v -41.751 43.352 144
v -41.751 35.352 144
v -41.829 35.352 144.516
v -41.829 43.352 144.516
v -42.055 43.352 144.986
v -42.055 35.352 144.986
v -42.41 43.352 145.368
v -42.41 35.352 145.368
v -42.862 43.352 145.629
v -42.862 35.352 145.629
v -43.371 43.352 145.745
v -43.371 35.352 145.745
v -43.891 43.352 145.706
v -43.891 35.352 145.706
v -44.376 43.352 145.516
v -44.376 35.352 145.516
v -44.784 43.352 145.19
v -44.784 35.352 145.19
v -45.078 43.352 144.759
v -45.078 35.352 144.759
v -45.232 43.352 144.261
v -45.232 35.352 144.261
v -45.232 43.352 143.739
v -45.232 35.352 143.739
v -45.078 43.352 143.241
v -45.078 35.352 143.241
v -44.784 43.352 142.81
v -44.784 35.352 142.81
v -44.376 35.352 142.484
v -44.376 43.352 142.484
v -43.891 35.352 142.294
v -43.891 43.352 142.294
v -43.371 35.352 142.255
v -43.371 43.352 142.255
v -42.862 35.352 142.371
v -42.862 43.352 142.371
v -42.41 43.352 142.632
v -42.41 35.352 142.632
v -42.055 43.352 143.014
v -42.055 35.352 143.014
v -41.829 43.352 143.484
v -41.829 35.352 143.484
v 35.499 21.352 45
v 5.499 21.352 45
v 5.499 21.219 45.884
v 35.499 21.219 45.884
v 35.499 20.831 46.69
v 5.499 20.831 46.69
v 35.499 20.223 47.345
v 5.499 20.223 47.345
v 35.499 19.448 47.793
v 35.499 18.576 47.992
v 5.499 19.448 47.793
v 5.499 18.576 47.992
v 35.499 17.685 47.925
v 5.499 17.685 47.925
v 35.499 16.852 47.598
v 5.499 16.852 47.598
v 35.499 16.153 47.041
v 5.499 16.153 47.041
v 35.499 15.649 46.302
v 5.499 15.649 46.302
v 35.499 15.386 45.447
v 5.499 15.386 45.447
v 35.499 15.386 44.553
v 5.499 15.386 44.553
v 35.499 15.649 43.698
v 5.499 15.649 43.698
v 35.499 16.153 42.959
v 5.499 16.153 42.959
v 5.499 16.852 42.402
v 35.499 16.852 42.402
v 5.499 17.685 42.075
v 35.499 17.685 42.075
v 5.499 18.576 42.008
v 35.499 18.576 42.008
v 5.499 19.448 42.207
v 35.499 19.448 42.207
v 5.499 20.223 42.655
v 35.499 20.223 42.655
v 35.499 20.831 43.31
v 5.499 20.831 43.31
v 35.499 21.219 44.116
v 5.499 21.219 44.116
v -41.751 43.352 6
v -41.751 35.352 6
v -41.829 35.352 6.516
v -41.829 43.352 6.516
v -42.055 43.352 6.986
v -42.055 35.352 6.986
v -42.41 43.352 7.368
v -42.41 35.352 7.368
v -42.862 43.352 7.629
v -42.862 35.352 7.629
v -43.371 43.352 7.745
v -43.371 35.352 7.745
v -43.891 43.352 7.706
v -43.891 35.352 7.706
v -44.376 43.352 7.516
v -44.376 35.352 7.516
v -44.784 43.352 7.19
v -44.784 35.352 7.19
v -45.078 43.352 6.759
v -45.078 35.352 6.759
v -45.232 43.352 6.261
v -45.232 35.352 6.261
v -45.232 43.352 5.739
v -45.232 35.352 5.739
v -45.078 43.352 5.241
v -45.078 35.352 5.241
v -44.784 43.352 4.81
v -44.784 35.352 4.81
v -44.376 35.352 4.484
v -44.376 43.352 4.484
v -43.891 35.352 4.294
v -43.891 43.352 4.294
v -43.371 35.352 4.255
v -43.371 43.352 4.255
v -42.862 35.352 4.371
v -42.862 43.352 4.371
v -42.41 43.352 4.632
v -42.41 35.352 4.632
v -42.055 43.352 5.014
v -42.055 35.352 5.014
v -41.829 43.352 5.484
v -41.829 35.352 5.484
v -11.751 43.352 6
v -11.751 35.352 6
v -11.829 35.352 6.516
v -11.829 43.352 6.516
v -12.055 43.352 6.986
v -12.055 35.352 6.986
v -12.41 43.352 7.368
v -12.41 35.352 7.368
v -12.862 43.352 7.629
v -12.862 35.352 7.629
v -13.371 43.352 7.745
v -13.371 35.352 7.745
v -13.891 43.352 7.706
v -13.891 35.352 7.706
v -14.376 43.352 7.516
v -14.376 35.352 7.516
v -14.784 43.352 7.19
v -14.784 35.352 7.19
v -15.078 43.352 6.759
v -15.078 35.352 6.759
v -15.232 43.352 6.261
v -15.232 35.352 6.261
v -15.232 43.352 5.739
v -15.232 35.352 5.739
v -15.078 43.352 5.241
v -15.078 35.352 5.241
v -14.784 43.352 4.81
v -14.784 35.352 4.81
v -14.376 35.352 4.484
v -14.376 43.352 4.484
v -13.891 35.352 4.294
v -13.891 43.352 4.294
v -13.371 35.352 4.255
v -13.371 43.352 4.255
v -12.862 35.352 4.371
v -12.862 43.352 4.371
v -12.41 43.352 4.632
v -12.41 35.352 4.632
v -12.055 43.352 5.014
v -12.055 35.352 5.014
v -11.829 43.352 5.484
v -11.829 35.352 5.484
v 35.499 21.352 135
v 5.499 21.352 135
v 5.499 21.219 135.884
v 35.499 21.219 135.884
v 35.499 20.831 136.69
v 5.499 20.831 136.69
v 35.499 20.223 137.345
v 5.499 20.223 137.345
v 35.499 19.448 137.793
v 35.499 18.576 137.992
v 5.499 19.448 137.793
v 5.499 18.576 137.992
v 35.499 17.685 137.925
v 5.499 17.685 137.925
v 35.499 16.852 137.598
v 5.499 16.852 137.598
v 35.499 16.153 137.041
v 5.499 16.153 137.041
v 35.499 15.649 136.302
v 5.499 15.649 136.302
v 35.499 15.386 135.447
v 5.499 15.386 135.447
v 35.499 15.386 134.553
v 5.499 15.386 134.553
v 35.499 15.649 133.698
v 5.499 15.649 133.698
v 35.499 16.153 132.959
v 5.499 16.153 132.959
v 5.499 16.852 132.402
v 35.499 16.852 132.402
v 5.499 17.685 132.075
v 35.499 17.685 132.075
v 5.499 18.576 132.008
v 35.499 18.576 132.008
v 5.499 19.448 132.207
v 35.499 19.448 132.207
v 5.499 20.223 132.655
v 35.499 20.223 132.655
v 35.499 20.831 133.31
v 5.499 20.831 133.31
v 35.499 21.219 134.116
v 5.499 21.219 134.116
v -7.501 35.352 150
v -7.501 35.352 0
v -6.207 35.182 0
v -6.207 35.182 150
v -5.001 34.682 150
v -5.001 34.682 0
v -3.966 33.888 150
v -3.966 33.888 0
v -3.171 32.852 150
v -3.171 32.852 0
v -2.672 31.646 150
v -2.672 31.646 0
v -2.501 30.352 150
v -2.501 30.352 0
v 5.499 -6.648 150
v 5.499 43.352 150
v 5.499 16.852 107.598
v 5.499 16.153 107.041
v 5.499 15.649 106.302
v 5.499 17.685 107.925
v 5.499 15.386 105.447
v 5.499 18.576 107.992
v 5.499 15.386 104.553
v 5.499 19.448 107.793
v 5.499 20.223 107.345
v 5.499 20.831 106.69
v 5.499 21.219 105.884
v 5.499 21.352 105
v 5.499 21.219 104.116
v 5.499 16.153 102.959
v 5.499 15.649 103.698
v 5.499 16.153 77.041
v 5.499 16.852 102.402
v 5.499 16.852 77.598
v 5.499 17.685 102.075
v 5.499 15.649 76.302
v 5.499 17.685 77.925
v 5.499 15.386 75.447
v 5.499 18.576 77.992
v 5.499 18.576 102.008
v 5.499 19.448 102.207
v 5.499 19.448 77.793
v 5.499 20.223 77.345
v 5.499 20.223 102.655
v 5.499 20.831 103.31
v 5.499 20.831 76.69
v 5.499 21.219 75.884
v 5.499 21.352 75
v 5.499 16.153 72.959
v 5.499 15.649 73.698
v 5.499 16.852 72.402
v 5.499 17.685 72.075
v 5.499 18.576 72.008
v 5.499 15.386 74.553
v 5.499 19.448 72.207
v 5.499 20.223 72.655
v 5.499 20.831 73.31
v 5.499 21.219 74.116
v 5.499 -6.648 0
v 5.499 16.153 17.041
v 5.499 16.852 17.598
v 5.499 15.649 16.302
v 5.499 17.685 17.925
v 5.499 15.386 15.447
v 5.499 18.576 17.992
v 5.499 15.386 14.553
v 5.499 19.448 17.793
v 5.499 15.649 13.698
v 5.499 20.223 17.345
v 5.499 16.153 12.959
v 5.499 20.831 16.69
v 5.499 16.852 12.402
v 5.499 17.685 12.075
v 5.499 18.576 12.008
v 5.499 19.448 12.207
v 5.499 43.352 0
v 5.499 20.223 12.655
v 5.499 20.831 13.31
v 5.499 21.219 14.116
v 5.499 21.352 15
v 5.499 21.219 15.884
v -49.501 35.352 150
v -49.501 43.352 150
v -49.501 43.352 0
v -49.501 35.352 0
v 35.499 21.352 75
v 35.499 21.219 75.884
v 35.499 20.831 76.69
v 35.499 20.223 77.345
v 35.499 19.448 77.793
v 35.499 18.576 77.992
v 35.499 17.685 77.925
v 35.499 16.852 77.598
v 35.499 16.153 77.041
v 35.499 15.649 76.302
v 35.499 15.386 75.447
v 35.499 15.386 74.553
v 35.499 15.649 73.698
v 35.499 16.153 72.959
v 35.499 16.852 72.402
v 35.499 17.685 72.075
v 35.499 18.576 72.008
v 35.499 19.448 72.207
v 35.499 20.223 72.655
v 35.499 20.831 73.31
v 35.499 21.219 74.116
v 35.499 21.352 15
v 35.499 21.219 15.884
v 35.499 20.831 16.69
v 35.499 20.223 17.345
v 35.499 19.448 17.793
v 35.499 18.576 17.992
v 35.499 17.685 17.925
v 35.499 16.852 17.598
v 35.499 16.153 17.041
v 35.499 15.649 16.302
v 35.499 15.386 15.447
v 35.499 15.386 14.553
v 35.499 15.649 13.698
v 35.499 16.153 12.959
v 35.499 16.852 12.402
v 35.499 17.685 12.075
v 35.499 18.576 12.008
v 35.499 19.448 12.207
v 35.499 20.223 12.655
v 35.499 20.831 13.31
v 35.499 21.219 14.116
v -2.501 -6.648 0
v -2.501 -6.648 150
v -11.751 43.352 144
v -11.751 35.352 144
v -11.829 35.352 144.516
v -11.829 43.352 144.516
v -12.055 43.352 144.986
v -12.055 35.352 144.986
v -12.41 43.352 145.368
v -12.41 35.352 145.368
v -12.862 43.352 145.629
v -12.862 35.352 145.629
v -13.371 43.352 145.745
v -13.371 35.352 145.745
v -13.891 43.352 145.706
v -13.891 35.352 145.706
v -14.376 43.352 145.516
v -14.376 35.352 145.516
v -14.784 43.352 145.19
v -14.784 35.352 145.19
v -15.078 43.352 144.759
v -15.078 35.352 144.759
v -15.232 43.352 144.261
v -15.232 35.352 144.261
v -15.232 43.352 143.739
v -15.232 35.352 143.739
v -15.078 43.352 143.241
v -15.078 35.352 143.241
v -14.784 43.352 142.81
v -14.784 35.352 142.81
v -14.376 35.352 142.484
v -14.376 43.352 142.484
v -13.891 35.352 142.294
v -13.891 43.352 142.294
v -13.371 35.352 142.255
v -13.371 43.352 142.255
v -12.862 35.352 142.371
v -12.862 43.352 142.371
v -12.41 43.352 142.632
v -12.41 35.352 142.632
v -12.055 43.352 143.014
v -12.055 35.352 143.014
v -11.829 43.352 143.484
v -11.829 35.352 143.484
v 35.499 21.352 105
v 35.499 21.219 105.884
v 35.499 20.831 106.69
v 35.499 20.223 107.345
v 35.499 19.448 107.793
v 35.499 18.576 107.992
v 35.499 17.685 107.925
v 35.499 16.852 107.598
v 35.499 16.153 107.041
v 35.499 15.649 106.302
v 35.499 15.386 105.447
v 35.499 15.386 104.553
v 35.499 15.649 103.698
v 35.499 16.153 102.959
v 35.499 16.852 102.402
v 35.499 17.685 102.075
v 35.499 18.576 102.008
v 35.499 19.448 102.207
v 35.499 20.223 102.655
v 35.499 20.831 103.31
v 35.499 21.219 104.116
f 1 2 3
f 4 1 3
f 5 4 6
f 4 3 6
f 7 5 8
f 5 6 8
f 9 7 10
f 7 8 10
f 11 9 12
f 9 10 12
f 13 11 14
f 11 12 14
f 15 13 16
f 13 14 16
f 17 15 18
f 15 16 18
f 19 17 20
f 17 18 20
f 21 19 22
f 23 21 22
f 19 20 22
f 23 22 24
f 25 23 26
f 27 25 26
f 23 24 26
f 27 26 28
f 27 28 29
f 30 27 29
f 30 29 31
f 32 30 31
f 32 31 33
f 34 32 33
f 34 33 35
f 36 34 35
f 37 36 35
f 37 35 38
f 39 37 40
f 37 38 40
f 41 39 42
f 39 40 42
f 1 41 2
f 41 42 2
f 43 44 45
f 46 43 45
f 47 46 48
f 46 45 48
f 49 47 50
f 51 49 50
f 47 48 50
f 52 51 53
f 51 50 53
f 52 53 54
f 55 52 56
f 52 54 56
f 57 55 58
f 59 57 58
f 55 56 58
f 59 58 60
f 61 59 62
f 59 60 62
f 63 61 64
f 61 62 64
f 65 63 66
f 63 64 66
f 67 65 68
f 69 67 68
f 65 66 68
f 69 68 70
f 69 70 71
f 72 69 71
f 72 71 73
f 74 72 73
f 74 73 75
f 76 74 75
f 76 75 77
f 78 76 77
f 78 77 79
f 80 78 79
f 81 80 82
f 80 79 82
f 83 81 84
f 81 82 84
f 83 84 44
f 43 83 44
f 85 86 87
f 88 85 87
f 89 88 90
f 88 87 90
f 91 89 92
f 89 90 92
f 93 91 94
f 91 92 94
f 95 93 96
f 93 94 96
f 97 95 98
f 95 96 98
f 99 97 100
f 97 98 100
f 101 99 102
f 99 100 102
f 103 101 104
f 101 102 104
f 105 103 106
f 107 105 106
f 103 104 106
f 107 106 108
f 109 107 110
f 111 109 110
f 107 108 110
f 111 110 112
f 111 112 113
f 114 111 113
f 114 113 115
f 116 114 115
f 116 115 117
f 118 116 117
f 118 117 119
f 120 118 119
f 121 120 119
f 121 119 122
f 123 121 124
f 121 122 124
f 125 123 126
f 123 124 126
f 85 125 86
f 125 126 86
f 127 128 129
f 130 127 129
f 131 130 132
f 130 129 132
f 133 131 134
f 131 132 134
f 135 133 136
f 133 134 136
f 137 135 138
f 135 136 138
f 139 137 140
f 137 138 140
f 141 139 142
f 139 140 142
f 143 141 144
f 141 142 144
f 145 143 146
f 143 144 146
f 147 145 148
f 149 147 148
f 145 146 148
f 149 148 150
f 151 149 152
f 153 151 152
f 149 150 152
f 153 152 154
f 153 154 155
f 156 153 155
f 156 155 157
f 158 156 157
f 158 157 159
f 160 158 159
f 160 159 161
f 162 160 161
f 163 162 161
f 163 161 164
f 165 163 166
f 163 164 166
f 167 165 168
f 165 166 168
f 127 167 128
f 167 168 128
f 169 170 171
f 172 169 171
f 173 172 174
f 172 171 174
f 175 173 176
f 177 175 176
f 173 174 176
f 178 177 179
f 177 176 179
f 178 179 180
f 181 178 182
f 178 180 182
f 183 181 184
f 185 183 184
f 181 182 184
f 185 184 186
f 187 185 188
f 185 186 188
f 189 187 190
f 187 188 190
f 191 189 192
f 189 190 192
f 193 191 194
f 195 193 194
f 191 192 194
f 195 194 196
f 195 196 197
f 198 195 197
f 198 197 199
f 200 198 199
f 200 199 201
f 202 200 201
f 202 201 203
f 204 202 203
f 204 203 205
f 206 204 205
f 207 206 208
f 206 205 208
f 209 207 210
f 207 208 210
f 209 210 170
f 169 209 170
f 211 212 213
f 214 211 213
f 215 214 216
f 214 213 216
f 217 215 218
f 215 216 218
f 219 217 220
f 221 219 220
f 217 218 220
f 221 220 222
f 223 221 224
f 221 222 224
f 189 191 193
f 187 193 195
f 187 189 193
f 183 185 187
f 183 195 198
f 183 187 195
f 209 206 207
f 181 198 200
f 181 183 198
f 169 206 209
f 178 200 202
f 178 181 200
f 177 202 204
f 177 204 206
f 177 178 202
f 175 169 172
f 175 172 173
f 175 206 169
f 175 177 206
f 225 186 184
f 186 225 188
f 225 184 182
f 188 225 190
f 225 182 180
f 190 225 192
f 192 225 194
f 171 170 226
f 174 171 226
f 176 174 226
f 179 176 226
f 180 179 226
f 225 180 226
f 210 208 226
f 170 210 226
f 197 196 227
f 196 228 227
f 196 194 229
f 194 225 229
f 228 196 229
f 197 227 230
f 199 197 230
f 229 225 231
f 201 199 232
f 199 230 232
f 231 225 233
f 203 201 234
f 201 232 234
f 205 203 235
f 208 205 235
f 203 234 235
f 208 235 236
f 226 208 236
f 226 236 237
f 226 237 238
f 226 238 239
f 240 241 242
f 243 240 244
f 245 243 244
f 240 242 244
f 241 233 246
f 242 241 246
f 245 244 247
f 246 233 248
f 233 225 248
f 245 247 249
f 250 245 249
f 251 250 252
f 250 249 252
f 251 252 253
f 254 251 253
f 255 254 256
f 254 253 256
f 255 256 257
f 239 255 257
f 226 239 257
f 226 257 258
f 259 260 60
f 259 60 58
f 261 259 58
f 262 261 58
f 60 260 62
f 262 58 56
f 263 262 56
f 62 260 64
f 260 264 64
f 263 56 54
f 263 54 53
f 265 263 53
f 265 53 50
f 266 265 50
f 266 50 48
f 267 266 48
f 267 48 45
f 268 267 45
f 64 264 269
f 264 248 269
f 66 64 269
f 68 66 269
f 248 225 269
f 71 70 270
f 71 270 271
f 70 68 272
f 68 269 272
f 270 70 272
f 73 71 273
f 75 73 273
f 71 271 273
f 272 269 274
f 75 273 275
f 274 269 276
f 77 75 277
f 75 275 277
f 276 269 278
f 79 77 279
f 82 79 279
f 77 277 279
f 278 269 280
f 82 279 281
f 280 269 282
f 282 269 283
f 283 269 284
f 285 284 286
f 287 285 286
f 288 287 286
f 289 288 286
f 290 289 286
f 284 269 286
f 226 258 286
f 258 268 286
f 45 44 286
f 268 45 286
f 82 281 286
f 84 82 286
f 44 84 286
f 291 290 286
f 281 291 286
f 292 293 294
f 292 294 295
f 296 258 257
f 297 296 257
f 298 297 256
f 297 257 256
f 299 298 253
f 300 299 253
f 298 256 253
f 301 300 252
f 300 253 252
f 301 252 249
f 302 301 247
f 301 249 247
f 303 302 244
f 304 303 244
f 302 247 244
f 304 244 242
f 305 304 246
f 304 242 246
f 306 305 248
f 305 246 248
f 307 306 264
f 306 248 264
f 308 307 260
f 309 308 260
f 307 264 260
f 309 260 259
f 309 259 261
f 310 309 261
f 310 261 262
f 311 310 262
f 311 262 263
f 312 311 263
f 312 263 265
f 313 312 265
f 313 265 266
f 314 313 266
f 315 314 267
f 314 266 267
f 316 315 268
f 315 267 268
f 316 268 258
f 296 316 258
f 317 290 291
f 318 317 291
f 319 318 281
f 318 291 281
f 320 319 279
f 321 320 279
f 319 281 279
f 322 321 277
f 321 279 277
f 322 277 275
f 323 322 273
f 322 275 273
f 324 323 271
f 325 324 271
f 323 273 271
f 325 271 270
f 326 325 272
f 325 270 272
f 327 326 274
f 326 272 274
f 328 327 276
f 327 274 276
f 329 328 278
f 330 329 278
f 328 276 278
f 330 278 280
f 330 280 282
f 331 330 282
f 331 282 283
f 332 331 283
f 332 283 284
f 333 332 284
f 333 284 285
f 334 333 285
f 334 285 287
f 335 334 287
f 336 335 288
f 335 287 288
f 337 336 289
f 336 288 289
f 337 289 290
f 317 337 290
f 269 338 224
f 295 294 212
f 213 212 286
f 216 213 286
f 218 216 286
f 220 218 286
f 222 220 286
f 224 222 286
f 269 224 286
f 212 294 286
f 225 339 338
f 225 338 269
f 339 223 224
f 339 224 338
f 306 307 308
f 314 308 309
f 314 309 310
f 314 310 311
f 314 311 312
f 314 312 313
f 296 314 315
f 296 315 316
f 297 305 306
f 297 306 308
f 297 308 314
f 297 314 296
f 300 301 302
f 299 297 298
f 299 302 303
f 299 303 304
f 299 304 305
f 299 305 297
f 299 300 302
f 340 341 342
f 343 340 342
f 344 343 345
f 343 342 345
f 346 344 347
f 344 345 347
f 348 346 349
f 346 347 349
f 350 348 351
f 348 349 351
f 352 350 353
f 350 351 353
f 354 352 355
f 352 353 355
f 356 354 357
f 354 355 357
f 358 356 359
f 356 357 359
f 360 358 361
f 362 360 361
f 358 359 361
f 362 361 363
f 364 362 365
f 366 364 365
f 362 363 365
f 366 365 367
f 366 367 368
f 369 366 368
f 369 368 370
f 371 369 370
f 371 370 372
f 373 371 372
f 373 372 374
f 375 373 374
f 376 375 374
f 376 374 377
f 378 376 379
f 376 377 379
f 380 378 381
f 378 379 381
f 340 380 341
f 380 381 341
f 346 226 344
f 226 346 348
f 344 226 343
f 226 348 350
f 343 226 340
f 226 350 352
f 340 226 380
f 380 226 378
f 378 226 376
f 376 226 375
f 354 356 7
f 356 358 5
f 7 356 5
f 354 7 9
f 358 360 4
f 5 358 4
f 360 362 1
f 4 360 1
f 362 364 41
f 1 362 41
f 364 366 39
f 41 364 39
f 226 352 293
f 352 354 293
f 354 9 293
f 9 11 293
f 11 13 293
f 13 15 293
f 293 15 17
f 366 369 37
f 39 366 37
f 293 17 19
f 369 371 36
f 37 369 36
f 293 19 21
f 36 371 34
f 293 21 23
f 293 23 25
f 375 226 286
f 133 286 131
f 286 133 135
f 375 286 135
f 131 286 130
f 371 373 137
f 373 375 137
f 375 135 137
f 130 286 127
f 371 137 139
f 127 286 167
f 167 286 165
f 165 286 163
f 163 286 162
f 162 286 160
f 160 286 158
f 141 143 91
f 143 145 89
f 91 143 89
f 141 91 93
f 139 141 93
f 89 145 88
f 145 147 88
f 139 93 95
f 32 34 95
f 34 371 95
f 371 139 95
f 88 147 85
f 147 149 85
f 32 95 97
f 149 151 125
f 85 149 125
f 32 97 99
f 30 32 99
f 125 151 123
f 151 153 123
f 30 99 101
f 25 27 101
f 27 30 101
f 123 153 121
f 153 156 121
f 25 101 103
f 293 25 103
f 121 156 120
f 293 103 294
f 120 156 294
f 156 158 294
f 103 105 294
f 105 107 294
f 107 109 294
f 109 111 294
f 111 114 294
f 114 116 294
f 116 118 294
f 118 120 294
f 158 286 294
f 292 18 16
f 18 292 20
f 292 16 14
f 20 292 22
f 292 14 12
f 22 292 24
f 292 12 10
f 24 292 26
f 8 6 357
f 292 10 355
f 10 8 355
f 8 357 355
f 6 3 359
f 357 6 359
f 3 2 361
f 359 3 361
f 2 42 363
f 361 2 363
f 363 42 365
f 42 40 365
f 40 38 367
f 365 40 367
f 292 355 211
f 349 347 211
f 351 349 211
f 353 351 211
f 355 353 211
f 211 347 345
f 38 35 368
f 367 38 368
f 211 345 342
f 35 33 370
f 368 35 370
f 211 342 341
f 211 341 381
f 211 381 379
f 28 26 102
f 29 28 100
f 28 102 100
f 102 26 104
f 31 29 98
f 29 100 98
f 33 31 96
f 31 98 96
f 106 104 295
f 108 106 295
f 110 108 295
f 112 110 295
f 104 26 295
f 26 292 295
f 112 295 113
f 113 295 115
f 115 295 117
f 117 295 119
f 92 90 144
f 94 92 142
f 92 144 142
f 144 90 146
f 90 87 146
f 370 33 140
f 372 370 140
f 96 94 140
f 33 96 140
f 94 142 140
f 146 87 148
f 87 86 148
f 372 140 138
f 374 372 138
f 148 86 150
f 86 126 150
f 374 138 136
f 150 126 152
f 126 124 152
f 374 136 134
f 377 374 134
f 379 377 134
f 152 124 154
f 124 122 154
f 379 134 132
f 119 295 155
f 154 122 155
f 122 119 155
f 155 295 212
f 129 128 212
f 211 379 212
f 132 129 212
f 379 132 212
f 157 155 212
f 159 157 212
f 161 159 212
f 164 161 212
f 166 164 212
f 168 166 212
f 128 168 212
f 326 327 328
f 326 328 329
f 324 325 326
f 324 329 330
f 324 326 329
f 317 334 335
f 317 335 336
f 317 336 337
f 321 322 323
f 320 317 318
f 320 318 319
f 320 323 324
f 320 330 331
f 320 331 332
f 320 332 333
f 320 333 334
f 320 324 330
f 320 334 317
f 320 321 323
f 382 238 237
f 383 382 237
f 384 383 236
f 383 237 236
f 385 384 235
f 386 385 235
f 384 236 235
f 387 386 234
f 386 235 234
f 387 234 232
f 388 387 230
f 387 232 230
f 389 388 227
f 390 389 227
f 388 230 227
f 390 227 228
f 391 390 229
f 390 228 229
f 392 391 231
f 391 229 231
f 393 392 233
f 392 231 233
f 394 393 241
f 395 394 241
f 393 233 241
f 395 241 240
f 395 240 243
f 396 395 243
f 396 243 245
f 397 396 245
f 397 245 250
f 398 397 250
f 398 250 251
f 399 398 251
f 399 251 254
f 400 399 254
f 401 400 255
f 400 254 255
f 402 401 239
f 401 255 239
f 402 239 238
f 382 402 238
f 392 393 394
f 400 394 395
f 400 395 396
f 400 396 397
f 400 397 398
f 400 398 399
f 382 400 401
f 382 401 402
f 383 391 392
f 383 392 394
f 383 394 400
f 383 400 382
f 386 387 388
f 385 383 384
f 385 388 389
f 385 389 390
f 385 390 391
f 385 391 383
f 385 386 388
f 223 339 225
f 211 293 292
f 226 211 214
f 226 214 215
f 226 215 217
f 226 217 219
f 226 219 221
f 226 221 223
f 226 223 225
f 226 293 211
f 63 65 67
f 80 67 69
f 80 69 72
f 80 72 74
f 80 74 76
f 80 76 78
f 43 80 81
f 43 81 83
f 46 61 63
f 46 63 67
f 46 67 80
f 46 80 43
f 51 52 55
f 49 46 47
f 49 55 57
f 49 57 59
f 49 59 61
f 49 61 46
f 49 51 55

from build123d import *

# Parameters (mm, degrees)
F1_DEPTH = 150
F2_R     = 3
F3_DEPTH = 30
F4_R     = 1.75
F5_DEPTH = 8


with BuildPart() as f1:
    # F0 (on Top) → F1 (new body)
    with BuildSketch(Plane.XY):
        with BuildLine():
            Line((-49.501332, 43.352309), (-49.501332, 35.352309))
            Line((-49.501332, 35.352309), (-7.501332, 35.352309))
            ThreePointArc((-7.501332, 35.352309), (-3.965798, 33.887843), (-2.501332, 30.352309))
            Line((-2.501332, 30.352309), (-2.501332, -6.647691))
            Line((-2.501332, -6.647691), (5.498668, -6.647691))
            Line((5.498668, -6.647691), (5.498668, 43.352309))
            Line((5.498668, 43.352309), (-49.501332, 43.352309))
        make_face()
    extrude(amount=F1_DEPTH)

    # F2 (on face) → F3 (join)
    with BuildSketch(Plane.YZ.offset(5.498668)):
        with Locations((18.352309, 135)):
            Circle(F2_R)
        with Locations((18.352309, 105)):
            Circle(F2_R)
        with Locations((18.352309, 75)):
            Circle(F2_R)
        with Locations((18.352309, 45)):
            Circle(F2_R)
        with Locations((18.352309, 15)):
            Circle(F2_R)
    extrude(amount=F3_DEPTH)

    # F4 (on face) → F5 (cut)
    with BuildSketch(Plane.XZ.offset(-35.352309)):
        with Locations((-43.501332, 6)):
            Circle(F4_R)
        with Locations((-13.501332, 6)):
            Circle(F4_R)
        with Locations((-43.501332, 144)):
            Circle(F4_R)
        with Locations((-13.501332, 144)):
            Circle(F4_R)
    extrude(amount=-F5_DEPTH, mode=Mode.SUBTRACT)


solid = f1.part
